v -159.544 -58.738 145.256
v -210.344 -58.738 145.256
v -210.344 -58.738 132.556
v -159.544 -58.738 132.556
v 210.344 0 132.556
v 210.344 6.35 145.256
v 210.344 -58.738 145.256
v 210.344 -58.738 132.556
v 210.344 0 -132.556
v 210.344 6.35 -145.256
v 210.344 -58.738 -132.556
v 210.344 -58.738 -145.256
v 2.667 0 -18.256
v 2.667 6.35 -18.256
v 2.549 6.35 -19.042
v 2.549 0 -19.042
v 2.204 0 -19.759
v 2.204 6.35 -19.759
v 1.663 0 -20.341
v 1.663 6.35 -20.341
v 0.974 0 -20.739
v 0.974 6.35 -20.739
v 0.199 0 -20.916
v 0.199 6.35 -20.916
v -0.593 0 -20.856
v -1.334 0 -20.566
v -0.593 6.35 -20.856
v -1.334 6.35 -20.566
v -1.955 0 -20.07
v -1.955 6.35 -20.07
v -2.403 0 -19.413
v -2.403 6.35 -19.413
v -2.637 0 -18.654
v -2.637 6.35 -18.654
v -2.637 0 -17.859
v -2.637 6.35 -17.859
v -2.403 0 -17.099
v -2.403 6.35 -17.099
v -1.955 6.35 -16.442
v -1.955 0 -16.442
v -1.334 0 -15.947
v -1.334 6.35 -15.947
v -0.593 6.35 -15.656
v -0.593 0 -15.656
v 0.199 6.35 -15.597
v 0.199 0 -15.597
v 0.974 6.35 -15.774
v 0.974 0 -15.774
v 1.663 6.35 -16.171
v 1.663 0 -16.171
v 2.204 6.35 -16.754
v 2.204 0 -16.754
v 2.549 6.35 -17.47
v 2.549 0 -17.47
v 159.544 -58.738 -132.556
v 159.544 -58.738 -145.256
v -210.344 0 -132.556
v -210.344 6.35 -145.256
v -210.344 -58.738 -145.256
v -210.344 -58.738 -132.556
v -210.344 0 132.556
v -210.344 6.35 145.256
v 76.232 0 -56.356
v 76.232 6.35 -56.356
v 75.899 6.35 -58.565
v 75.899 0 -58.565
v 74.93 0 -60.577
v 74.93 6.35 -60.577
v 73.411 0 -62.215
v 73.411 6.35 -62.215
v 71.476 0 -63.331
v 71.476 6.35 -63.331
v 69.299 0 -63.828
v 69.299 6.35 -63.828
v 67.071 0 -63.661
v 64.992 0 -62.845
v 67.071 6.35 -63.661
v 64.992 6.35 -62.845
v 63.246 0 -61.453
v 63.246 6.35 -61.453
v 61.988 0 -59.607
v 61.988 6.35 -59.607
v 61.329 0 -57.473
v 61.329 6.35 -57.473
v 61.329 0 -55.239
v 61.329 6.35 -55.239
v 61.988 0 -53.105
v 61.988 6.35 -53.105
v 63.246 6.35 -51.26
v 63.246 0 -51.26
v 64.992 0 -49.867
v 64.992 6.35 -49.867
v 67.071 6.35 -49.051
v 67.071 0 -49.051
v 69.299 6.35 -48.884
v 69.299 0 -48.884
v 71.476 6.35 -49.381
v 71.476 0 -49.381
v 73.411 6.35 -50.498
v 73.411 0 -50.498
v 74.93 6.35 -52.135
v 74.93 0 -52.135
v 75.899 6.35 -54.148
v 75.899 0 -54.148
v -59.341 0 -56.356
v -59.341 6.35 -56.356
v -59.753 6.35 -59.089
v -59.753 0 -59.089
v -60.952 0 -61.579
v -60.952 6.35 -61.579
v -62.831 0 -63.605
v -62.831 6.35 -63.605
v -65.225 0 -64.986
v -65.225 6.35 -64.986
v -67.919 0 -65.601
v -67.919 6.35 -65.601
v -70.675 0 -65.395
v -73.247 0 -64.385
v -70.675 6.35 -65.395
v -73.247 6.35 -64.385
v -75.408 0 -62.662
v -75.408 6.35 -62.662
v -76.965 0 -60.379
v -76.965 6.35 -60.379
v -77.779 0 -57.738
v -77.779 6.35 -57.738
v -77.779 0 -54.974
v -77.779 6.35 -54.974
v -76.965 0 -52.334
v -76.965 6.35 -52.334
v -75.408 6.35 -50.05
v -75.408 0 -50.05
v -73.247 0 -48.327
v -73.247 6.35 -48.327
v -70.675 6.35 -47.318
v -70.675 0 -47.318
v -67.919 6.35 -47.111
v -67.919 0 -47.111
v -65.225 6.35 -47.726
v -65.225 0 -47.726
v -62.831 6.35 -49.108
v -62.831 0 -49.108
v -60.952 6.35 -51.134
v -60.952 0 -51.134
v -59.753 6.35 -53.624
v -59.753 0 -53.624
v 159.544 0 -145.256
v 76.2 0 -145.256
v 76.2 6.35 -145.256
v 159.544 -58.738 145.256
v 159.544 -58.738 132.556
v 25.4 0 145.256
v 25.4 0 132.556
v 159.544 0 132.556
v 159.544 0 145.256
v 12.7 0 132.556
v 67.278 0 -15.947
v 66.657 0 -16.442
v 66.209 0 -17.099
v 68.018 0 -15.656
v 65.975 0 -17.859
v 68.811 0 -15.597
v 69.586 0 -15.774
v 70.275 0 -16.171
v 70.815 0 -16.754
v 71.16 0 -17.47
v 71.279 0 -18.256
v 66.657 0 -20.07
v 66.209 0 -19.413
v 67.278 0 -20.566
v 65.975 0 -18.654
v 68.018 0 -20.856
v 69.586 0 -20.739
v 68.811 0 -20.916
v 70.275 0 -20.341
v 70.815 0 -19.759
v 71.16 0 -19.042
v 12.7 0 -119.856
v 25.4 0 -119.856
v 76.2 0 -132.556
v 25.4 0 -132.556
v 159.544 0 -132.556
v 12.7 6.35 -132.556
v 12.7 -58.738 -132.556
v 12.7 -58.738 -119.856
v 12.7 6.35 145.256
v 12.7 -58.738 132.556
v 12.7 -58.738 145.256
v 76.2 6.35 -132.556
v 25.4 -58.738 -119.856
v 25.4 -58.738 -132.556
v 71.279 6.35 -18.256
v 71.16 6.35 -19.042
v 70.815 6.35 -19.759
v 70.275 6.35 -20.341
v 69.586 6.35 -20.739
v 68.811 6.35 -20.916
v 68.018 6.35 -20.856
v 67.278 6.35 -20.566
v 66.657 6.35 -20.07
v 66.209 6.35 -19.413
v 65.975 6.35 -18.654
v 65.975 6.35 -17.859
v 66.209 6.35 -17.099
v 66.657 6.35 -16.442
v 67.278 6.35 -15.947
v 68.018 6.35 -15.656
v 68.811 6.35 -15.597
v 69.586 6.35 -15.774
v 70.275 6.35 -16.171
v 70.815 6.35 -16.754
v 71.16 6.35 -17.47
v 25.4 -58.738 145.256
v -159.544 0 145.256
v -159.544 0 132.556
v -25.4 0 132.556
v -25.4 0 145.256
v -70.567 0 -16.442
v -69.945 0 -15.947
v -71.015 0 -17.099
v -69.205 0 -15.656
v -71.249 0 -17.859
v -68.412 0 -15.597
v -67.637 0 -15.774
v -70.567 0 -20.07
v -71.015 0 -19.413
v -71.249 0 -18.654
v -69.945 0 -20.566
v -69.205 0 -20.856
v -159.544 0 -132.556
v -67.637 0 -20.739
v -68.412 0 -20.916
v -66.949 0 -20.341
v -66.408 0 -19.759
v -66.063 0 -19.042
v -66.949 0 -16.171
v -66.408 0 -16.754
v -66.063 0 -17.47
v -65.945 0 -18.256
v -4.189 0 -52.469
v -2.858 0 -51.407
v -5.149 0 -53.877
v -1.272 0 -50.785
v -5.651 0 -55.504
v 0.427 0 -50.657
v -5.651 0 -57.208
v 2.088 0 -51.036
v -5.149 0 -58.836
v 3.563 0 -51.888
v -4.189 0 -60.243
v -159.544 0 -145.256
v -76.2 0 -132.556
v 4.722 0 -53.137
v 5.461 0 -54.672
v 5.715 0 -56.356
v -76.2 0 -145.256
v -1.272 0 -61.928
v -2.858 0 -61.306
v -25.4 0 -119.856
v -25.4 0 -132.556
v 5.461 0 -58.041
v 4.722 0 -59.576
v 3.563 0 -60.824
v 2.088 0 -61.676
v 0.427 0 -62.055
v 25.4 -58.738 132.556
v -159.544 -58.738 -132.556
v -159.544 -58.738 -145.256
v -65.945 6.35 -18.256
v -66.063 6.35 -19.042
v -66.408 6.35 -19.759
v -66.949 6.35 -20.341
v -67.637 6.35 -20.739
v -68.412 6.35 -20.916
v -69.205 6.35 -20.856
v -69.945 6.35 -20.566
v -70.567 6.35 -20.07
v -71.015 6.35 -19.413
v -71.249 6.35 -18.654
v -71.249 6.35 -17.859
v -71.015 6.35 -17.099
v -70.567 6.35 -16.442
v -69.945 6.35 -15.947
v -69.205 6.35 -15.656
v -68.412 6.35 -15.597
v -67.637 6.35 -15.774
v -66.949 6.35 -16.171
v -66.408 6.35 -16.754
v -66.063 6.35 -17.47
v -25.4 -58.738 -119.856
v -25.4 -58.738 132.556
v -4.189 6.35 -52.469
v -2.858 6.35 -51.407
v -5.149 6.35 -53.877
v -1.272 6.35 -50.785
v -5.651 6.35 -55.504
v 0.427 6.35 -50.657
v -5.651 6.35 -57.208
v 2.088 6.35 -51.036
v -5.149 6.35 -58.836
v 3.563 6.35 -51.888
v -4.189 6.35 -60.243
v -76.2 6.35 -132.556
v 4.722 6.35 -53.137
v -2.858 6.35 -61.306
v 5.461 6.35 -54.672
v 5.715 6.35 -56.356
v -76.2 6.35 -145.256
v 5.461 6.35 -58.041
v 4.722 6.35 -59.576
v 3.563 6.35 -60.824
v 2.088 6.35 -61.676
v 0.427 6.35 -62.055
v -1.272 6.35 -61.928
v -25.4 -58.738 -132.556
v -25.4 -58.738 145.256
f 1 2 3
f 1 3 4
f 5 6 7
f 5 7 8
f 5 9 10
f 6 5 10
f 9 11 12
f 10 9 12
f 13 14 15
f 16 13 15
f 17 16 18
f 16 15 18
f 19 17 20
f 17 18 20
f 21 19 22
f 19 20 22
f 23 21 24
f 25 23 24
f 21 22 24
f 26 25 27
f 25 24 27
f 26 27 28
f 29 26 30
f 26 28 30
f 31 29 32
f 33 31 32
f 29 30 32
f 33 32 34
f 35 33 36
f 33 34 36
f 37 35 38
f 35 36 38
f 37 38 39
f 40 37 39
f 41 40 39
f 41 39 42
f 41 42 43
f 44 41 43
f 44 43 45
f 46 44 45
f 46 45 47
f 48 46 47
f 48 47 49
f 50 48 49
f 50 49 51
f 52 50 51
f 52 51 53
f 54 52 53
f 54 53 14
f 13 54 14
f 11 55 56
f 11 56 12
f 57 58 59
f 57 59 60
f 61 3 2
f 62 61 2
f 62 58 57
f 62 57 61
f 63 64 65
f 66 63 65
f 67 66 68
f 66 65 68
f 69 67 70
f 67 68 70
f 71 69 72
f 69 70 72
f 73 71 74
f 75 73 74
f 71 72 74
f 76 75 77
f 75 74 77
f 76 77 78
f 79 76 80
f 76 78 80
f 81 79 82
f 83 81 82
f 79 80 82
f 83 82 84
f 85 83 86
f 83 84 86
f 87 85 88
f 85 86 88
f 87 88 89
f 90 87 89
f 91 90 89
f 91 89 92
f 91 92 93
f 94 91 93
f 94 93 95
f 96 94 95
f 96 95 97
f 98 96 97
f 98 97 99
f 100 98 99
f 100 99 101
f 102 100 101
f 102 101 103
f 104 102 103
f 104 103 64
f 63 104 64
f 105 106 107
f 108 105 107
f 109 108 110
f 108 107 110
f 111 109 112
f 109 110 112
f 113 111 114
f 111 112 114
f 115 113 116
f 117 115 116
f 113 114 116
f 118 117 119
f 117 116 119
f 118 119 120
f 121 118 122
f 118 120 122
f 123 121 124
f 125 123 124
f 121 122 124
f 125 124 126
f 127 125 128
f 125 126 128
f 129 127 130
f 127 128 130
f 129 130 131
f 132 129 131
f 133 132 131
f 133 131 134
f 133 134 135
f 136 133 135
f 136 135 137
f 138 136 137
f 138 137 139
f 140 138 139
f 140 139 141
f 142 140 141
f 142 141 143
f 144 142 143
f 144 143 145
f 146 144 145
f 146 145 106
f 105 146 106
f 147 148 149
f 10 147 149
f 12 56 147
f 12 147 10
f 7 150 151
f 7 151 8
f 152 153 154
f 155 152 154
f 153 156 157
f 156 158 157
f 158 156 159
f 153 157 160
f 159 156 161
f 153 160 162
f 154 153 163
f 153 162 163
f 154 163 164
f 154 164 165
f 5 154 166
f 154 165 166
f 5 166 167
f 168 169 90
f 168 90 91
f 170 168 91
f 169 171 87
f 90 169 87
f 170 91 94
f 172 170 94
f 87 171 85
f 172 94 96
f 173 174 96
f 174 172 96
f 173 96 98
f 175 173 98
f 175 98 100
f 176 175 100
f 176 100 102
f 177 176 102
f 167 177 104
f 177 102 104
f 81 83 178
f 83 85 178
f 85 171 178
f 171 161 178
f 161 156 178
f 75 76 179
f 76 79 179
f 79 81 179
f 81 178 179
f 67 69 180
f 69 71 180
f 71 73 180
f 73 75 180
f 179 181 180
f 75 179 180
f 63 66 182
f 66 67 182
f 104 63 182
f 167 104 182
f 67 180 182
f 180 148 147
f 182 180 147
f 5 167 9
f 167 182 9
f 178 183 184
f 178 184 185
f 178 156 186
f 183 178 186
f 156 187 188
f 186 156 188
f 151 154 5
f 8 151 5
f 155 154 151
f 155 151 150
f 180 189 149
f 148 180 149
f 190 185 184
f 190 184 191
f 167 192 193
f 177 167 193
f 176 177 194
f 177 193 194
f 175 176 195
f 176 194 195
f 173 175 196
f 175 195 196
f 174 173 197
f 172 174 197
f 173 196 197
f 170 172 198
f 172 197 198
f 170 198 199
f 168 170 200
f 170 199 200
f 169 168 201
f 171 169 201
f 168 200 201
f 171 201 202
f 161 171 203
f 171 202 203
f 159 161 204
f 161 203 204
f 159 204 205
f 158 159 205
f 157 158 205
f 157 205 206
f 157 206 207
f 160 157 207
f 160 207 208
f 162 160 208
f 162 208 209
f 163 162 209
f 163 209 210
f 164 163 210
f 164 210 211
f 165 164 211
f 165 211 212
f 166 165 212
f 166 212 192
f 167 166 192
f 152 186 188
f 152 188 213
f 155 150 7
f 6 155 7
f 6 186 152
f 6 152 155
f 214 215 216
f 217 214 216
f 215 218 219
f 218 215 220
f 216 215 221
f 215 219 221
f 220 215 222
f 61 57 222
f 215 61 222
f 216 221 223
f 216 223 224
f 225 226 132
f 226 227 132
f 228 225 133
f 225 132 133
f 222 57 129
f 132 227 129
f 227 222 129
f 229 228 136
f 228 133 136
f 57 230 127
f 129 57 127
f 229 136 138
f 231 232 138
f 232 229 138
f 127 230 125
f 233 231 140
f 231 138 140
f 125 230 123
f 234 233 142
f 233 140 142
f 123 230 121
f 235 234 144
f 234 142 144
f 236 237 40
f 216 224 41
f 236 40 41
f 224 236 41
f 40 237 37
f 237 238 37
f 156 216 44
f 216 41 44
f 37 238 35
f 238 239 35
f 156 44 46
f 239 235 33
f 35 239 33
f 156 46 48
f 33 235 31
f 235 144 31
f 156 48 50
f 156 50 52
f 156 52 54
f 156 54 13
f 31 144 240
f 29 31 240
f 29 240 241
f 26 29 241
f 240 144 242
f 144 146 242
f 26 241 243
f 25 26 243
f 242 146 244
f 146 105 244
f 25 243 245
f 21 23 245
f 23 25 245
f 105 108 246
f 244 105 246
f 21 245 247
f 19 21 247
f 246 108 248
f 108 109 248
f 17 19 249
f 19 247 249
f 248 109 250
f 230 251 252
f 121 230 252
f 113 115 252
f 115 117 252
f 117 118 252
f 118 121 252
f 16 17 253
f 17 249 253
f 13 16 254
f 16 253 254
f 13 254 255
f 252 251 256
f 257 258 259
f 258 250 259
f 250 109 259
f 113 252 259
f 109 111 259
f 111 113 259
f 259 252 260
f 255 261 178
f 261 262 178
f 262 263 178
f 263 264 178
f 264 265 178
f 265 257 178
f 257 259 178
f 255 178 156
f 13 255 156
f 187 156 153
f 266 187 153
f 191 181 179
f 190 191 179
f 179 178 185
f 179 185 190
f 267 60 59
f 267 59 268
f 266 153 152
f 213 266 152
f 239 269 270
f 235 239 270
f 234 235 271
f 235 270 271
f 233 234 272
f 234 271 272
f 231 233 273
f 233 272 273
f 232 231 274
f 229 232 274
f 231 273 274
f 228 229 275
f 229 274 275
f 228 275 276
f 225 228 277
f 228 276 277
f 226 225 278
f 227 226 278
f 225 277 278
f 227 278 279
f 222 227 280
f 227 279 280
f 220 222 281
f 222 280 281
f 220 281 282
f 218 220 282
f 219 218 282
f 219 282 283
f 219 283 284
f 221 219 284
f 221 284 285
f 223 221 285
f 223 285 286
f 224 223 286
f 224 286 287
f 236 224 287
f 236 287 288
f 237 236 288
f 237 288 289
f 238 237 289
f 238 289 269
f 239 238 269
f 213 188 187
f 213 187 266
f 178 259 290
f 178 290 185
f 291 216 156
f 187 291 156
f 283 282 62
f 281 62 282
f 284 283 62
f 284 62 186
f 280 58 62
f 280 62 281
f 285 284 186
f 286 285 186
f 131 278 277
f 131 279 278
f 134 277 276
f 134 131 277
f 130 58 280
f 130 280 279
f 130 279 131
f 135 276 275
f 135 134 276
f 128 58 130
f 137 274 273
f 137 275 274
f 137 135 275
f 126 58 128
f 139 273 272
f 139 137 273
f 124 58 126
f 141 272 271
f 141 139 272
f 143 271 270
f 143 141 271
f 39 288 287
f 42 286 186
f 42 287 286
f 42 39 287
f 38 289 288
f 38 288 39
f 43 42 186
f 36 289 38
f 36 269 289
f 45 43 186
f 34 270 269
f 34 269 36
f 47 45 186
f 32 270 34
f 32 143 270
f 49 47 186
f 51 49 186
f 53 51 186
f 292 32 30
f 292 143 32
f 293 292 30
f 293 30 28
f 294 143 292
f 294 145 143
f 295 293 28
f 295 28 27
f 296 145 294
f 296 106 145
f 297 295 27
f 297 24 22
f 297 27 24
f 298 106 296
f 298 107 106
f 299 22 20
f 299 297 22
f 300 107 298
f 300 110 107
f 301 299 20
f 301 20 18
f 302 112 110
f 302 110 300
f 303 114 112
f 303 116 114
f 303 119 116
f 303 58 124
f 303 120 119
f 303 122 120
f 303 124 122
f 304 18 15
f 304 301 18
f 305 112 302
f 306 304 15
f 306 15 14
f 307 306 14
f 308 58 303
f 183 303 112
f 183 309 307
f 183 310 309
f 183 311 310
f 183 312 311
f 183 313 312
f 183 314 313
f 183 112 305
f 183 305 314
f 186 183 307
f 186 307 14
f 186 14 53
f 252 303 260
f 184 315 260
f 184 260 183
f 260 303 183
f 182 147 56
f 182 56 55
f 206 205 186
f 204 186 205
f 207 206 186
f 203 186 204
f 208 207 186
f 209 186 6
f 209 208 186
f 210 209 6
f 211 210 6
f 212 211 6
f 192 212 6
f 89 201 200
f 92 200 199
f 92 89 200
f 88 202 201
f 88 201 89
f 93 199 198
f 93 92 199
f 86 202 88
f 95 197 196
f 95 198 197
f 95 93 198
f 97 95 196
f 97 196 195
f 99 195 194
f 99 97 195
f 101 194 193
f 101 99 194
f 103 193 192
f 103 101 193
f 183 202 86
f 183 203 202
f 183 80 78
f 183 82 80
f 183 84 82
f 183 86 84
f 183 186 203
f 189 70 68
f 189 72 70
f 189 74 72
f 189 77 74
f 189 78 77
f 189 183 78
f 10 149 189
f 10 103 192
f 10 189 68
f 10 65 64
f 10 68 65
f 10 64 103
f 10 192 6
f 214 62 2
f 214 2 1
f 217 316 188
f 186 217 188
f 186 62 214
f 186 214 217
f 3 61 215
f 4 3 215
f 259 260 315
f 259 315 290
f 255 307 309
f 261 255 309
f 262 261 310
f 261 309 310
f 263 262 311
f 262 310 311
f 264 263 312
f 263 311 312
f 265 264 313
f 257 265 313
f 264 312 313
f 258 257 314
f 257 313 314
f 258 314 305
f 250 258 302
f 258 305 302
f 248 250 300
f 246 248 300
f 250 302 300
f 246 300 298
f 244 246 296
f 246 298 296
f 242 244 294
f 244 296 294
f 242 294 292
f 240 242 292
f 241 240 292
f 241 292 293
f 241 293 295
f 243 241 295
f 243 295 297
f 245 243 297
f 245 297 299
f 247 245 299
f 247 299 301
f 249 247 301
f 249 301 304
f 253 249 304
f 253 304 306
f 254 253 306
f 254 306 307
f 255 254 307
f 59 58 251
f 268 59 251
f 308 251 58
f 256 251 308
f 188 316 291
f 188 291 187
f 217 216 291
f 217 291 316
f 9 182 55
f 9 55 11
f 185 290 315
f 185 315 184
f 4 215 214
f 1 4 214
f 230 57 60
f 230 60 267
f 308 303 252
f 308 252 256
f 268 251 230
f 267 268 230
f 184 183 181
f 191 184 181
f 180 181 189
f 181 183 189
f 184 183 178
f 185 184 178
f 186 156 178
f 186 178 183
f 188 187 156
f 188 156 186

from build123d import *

# Parameters (mm, degrees)
SKETCH1_W                 = 420.6875
SKETCH1_H                 = 290.5125
DESKTOP_DEPTH             = 6.35
SKETCH5_W                 = 152.4
SKETCH5_H                 = 12.7
HDMI_SCREEN_CUTOUT_DEPTH  = 16.51
SKETCH8_R                 = 7.493
SKETCH8_R_2               = 9.271
SKETCH8_R_3               = 5.715
SKETCH8_R_4               = 2.667
SWITCHES_AND_LIGHTS_DEPTH = 16.51
SKETCH9_W                 = 50.8
SKETCH9_H                 = 12.7
BOSS_EXTRUDE1_DEPTH       = 58.7375


with BuildPart() as part:
    # Sketch1 → Desktop (new body)
    with BuildSketch(Plane(origin=(0, 0, 0), x_dir=(1, 0, 0), z_dir=(0, 1, 0))):
        Rectangle(SKETCH1_W, SKETCH1_H)
    extrude(amount=DESKTOP_DEPTH)

    # Sketch5 → HDMI Screen Cutout (cut)
    with BuildSketch(Plane(origin=(0, 6.35, 0), x_dir=(1, 0, 0), z_dir=(0, 1, 0))):
        with Locations((0, 138.90625)):
            Rectangle(SKETCH5_W, SKETCH5_H)
    extrude(amount=-HDMI_SCREEN_CUTOUT_DEPTH, mode=Mode.SUBTRACT)

    # Sketch8 → Switches and Lights (cut)
    with BuildSketch(Plane(origin=(0, 6.35, 0), x_dir=(1, 0, 0), z_dir=(0, 1, 0))):
        with Locations((68.73875, 56.35625)):
            Circle(SKETCH8_R)
        with Locations((-68.61175, 56.35625)):
            Circle(SKETCH8_R_2)
        with Locations((0, 56.35625)):
            Circle(SKETCH8_R_3)
        with Locations((-68.61175, 18.25625)):
            Circle(SKETCH8_R_4)
        with Locations((0, 18.25625)):
            Circle(SKETCH8_R_4)
        with Locations((68.61175, 18.25625)):
            Circle(SKETCH8_R_4)
    extrude(amount=-SWITCHES_AND_LIGHTS_DEPTH, mode=Mode.SUBTRACT)

    # Sketch9 → Boss-Extrude1 (add)
    with BuildSketch(Plane.XZ):
        with Locations((0, 138.90625)):
            Rectangle(SKETCH9_W, SKETCH9_H)
        with Locations((-184.94375, 138.90625)):
            Rectangle(SKETCH9_W, SKETCH9_H)
        with Locations((-184.94375, -138.90625)):
            Rectangle(SKETCH9_W, SKETCH9_H)
        with Locations((184.94375, -138.90625)):
            Rectangle(SKETCH9_W, SKETCH9_H)
        with Locations((184.94375, 138.90625)):
            Rectangle(SKETCH9_W, SKETCH9_H)
        with Locations((0, -126.20625)):
            Rectangle(SKETCH9_W, SKETCH9_H)
    extrude(amount=BOSS_EXTRUDE1_DEPTH)


with BuildPart() as body_2:
    # Split2: the piece on the far side of the plane
    add(part.part)
    split(bisect_by=Plane(origin=(12.7, 0, 0), x_dir=(0, 0, 1), z_dir=(1, 0, 0)), keep=Keep.BOTTOM)


with BuildPart() as part_1:
    add(part.part)

    # Split2
    split(bisect_by=Plane(origin=(12.7, 0, 0), x_dir=(0, 0, 1), z_dir=(1, 0, 0)), keep=Keep.TOP)


solid = Compound([body_2.part, part_1.part])
